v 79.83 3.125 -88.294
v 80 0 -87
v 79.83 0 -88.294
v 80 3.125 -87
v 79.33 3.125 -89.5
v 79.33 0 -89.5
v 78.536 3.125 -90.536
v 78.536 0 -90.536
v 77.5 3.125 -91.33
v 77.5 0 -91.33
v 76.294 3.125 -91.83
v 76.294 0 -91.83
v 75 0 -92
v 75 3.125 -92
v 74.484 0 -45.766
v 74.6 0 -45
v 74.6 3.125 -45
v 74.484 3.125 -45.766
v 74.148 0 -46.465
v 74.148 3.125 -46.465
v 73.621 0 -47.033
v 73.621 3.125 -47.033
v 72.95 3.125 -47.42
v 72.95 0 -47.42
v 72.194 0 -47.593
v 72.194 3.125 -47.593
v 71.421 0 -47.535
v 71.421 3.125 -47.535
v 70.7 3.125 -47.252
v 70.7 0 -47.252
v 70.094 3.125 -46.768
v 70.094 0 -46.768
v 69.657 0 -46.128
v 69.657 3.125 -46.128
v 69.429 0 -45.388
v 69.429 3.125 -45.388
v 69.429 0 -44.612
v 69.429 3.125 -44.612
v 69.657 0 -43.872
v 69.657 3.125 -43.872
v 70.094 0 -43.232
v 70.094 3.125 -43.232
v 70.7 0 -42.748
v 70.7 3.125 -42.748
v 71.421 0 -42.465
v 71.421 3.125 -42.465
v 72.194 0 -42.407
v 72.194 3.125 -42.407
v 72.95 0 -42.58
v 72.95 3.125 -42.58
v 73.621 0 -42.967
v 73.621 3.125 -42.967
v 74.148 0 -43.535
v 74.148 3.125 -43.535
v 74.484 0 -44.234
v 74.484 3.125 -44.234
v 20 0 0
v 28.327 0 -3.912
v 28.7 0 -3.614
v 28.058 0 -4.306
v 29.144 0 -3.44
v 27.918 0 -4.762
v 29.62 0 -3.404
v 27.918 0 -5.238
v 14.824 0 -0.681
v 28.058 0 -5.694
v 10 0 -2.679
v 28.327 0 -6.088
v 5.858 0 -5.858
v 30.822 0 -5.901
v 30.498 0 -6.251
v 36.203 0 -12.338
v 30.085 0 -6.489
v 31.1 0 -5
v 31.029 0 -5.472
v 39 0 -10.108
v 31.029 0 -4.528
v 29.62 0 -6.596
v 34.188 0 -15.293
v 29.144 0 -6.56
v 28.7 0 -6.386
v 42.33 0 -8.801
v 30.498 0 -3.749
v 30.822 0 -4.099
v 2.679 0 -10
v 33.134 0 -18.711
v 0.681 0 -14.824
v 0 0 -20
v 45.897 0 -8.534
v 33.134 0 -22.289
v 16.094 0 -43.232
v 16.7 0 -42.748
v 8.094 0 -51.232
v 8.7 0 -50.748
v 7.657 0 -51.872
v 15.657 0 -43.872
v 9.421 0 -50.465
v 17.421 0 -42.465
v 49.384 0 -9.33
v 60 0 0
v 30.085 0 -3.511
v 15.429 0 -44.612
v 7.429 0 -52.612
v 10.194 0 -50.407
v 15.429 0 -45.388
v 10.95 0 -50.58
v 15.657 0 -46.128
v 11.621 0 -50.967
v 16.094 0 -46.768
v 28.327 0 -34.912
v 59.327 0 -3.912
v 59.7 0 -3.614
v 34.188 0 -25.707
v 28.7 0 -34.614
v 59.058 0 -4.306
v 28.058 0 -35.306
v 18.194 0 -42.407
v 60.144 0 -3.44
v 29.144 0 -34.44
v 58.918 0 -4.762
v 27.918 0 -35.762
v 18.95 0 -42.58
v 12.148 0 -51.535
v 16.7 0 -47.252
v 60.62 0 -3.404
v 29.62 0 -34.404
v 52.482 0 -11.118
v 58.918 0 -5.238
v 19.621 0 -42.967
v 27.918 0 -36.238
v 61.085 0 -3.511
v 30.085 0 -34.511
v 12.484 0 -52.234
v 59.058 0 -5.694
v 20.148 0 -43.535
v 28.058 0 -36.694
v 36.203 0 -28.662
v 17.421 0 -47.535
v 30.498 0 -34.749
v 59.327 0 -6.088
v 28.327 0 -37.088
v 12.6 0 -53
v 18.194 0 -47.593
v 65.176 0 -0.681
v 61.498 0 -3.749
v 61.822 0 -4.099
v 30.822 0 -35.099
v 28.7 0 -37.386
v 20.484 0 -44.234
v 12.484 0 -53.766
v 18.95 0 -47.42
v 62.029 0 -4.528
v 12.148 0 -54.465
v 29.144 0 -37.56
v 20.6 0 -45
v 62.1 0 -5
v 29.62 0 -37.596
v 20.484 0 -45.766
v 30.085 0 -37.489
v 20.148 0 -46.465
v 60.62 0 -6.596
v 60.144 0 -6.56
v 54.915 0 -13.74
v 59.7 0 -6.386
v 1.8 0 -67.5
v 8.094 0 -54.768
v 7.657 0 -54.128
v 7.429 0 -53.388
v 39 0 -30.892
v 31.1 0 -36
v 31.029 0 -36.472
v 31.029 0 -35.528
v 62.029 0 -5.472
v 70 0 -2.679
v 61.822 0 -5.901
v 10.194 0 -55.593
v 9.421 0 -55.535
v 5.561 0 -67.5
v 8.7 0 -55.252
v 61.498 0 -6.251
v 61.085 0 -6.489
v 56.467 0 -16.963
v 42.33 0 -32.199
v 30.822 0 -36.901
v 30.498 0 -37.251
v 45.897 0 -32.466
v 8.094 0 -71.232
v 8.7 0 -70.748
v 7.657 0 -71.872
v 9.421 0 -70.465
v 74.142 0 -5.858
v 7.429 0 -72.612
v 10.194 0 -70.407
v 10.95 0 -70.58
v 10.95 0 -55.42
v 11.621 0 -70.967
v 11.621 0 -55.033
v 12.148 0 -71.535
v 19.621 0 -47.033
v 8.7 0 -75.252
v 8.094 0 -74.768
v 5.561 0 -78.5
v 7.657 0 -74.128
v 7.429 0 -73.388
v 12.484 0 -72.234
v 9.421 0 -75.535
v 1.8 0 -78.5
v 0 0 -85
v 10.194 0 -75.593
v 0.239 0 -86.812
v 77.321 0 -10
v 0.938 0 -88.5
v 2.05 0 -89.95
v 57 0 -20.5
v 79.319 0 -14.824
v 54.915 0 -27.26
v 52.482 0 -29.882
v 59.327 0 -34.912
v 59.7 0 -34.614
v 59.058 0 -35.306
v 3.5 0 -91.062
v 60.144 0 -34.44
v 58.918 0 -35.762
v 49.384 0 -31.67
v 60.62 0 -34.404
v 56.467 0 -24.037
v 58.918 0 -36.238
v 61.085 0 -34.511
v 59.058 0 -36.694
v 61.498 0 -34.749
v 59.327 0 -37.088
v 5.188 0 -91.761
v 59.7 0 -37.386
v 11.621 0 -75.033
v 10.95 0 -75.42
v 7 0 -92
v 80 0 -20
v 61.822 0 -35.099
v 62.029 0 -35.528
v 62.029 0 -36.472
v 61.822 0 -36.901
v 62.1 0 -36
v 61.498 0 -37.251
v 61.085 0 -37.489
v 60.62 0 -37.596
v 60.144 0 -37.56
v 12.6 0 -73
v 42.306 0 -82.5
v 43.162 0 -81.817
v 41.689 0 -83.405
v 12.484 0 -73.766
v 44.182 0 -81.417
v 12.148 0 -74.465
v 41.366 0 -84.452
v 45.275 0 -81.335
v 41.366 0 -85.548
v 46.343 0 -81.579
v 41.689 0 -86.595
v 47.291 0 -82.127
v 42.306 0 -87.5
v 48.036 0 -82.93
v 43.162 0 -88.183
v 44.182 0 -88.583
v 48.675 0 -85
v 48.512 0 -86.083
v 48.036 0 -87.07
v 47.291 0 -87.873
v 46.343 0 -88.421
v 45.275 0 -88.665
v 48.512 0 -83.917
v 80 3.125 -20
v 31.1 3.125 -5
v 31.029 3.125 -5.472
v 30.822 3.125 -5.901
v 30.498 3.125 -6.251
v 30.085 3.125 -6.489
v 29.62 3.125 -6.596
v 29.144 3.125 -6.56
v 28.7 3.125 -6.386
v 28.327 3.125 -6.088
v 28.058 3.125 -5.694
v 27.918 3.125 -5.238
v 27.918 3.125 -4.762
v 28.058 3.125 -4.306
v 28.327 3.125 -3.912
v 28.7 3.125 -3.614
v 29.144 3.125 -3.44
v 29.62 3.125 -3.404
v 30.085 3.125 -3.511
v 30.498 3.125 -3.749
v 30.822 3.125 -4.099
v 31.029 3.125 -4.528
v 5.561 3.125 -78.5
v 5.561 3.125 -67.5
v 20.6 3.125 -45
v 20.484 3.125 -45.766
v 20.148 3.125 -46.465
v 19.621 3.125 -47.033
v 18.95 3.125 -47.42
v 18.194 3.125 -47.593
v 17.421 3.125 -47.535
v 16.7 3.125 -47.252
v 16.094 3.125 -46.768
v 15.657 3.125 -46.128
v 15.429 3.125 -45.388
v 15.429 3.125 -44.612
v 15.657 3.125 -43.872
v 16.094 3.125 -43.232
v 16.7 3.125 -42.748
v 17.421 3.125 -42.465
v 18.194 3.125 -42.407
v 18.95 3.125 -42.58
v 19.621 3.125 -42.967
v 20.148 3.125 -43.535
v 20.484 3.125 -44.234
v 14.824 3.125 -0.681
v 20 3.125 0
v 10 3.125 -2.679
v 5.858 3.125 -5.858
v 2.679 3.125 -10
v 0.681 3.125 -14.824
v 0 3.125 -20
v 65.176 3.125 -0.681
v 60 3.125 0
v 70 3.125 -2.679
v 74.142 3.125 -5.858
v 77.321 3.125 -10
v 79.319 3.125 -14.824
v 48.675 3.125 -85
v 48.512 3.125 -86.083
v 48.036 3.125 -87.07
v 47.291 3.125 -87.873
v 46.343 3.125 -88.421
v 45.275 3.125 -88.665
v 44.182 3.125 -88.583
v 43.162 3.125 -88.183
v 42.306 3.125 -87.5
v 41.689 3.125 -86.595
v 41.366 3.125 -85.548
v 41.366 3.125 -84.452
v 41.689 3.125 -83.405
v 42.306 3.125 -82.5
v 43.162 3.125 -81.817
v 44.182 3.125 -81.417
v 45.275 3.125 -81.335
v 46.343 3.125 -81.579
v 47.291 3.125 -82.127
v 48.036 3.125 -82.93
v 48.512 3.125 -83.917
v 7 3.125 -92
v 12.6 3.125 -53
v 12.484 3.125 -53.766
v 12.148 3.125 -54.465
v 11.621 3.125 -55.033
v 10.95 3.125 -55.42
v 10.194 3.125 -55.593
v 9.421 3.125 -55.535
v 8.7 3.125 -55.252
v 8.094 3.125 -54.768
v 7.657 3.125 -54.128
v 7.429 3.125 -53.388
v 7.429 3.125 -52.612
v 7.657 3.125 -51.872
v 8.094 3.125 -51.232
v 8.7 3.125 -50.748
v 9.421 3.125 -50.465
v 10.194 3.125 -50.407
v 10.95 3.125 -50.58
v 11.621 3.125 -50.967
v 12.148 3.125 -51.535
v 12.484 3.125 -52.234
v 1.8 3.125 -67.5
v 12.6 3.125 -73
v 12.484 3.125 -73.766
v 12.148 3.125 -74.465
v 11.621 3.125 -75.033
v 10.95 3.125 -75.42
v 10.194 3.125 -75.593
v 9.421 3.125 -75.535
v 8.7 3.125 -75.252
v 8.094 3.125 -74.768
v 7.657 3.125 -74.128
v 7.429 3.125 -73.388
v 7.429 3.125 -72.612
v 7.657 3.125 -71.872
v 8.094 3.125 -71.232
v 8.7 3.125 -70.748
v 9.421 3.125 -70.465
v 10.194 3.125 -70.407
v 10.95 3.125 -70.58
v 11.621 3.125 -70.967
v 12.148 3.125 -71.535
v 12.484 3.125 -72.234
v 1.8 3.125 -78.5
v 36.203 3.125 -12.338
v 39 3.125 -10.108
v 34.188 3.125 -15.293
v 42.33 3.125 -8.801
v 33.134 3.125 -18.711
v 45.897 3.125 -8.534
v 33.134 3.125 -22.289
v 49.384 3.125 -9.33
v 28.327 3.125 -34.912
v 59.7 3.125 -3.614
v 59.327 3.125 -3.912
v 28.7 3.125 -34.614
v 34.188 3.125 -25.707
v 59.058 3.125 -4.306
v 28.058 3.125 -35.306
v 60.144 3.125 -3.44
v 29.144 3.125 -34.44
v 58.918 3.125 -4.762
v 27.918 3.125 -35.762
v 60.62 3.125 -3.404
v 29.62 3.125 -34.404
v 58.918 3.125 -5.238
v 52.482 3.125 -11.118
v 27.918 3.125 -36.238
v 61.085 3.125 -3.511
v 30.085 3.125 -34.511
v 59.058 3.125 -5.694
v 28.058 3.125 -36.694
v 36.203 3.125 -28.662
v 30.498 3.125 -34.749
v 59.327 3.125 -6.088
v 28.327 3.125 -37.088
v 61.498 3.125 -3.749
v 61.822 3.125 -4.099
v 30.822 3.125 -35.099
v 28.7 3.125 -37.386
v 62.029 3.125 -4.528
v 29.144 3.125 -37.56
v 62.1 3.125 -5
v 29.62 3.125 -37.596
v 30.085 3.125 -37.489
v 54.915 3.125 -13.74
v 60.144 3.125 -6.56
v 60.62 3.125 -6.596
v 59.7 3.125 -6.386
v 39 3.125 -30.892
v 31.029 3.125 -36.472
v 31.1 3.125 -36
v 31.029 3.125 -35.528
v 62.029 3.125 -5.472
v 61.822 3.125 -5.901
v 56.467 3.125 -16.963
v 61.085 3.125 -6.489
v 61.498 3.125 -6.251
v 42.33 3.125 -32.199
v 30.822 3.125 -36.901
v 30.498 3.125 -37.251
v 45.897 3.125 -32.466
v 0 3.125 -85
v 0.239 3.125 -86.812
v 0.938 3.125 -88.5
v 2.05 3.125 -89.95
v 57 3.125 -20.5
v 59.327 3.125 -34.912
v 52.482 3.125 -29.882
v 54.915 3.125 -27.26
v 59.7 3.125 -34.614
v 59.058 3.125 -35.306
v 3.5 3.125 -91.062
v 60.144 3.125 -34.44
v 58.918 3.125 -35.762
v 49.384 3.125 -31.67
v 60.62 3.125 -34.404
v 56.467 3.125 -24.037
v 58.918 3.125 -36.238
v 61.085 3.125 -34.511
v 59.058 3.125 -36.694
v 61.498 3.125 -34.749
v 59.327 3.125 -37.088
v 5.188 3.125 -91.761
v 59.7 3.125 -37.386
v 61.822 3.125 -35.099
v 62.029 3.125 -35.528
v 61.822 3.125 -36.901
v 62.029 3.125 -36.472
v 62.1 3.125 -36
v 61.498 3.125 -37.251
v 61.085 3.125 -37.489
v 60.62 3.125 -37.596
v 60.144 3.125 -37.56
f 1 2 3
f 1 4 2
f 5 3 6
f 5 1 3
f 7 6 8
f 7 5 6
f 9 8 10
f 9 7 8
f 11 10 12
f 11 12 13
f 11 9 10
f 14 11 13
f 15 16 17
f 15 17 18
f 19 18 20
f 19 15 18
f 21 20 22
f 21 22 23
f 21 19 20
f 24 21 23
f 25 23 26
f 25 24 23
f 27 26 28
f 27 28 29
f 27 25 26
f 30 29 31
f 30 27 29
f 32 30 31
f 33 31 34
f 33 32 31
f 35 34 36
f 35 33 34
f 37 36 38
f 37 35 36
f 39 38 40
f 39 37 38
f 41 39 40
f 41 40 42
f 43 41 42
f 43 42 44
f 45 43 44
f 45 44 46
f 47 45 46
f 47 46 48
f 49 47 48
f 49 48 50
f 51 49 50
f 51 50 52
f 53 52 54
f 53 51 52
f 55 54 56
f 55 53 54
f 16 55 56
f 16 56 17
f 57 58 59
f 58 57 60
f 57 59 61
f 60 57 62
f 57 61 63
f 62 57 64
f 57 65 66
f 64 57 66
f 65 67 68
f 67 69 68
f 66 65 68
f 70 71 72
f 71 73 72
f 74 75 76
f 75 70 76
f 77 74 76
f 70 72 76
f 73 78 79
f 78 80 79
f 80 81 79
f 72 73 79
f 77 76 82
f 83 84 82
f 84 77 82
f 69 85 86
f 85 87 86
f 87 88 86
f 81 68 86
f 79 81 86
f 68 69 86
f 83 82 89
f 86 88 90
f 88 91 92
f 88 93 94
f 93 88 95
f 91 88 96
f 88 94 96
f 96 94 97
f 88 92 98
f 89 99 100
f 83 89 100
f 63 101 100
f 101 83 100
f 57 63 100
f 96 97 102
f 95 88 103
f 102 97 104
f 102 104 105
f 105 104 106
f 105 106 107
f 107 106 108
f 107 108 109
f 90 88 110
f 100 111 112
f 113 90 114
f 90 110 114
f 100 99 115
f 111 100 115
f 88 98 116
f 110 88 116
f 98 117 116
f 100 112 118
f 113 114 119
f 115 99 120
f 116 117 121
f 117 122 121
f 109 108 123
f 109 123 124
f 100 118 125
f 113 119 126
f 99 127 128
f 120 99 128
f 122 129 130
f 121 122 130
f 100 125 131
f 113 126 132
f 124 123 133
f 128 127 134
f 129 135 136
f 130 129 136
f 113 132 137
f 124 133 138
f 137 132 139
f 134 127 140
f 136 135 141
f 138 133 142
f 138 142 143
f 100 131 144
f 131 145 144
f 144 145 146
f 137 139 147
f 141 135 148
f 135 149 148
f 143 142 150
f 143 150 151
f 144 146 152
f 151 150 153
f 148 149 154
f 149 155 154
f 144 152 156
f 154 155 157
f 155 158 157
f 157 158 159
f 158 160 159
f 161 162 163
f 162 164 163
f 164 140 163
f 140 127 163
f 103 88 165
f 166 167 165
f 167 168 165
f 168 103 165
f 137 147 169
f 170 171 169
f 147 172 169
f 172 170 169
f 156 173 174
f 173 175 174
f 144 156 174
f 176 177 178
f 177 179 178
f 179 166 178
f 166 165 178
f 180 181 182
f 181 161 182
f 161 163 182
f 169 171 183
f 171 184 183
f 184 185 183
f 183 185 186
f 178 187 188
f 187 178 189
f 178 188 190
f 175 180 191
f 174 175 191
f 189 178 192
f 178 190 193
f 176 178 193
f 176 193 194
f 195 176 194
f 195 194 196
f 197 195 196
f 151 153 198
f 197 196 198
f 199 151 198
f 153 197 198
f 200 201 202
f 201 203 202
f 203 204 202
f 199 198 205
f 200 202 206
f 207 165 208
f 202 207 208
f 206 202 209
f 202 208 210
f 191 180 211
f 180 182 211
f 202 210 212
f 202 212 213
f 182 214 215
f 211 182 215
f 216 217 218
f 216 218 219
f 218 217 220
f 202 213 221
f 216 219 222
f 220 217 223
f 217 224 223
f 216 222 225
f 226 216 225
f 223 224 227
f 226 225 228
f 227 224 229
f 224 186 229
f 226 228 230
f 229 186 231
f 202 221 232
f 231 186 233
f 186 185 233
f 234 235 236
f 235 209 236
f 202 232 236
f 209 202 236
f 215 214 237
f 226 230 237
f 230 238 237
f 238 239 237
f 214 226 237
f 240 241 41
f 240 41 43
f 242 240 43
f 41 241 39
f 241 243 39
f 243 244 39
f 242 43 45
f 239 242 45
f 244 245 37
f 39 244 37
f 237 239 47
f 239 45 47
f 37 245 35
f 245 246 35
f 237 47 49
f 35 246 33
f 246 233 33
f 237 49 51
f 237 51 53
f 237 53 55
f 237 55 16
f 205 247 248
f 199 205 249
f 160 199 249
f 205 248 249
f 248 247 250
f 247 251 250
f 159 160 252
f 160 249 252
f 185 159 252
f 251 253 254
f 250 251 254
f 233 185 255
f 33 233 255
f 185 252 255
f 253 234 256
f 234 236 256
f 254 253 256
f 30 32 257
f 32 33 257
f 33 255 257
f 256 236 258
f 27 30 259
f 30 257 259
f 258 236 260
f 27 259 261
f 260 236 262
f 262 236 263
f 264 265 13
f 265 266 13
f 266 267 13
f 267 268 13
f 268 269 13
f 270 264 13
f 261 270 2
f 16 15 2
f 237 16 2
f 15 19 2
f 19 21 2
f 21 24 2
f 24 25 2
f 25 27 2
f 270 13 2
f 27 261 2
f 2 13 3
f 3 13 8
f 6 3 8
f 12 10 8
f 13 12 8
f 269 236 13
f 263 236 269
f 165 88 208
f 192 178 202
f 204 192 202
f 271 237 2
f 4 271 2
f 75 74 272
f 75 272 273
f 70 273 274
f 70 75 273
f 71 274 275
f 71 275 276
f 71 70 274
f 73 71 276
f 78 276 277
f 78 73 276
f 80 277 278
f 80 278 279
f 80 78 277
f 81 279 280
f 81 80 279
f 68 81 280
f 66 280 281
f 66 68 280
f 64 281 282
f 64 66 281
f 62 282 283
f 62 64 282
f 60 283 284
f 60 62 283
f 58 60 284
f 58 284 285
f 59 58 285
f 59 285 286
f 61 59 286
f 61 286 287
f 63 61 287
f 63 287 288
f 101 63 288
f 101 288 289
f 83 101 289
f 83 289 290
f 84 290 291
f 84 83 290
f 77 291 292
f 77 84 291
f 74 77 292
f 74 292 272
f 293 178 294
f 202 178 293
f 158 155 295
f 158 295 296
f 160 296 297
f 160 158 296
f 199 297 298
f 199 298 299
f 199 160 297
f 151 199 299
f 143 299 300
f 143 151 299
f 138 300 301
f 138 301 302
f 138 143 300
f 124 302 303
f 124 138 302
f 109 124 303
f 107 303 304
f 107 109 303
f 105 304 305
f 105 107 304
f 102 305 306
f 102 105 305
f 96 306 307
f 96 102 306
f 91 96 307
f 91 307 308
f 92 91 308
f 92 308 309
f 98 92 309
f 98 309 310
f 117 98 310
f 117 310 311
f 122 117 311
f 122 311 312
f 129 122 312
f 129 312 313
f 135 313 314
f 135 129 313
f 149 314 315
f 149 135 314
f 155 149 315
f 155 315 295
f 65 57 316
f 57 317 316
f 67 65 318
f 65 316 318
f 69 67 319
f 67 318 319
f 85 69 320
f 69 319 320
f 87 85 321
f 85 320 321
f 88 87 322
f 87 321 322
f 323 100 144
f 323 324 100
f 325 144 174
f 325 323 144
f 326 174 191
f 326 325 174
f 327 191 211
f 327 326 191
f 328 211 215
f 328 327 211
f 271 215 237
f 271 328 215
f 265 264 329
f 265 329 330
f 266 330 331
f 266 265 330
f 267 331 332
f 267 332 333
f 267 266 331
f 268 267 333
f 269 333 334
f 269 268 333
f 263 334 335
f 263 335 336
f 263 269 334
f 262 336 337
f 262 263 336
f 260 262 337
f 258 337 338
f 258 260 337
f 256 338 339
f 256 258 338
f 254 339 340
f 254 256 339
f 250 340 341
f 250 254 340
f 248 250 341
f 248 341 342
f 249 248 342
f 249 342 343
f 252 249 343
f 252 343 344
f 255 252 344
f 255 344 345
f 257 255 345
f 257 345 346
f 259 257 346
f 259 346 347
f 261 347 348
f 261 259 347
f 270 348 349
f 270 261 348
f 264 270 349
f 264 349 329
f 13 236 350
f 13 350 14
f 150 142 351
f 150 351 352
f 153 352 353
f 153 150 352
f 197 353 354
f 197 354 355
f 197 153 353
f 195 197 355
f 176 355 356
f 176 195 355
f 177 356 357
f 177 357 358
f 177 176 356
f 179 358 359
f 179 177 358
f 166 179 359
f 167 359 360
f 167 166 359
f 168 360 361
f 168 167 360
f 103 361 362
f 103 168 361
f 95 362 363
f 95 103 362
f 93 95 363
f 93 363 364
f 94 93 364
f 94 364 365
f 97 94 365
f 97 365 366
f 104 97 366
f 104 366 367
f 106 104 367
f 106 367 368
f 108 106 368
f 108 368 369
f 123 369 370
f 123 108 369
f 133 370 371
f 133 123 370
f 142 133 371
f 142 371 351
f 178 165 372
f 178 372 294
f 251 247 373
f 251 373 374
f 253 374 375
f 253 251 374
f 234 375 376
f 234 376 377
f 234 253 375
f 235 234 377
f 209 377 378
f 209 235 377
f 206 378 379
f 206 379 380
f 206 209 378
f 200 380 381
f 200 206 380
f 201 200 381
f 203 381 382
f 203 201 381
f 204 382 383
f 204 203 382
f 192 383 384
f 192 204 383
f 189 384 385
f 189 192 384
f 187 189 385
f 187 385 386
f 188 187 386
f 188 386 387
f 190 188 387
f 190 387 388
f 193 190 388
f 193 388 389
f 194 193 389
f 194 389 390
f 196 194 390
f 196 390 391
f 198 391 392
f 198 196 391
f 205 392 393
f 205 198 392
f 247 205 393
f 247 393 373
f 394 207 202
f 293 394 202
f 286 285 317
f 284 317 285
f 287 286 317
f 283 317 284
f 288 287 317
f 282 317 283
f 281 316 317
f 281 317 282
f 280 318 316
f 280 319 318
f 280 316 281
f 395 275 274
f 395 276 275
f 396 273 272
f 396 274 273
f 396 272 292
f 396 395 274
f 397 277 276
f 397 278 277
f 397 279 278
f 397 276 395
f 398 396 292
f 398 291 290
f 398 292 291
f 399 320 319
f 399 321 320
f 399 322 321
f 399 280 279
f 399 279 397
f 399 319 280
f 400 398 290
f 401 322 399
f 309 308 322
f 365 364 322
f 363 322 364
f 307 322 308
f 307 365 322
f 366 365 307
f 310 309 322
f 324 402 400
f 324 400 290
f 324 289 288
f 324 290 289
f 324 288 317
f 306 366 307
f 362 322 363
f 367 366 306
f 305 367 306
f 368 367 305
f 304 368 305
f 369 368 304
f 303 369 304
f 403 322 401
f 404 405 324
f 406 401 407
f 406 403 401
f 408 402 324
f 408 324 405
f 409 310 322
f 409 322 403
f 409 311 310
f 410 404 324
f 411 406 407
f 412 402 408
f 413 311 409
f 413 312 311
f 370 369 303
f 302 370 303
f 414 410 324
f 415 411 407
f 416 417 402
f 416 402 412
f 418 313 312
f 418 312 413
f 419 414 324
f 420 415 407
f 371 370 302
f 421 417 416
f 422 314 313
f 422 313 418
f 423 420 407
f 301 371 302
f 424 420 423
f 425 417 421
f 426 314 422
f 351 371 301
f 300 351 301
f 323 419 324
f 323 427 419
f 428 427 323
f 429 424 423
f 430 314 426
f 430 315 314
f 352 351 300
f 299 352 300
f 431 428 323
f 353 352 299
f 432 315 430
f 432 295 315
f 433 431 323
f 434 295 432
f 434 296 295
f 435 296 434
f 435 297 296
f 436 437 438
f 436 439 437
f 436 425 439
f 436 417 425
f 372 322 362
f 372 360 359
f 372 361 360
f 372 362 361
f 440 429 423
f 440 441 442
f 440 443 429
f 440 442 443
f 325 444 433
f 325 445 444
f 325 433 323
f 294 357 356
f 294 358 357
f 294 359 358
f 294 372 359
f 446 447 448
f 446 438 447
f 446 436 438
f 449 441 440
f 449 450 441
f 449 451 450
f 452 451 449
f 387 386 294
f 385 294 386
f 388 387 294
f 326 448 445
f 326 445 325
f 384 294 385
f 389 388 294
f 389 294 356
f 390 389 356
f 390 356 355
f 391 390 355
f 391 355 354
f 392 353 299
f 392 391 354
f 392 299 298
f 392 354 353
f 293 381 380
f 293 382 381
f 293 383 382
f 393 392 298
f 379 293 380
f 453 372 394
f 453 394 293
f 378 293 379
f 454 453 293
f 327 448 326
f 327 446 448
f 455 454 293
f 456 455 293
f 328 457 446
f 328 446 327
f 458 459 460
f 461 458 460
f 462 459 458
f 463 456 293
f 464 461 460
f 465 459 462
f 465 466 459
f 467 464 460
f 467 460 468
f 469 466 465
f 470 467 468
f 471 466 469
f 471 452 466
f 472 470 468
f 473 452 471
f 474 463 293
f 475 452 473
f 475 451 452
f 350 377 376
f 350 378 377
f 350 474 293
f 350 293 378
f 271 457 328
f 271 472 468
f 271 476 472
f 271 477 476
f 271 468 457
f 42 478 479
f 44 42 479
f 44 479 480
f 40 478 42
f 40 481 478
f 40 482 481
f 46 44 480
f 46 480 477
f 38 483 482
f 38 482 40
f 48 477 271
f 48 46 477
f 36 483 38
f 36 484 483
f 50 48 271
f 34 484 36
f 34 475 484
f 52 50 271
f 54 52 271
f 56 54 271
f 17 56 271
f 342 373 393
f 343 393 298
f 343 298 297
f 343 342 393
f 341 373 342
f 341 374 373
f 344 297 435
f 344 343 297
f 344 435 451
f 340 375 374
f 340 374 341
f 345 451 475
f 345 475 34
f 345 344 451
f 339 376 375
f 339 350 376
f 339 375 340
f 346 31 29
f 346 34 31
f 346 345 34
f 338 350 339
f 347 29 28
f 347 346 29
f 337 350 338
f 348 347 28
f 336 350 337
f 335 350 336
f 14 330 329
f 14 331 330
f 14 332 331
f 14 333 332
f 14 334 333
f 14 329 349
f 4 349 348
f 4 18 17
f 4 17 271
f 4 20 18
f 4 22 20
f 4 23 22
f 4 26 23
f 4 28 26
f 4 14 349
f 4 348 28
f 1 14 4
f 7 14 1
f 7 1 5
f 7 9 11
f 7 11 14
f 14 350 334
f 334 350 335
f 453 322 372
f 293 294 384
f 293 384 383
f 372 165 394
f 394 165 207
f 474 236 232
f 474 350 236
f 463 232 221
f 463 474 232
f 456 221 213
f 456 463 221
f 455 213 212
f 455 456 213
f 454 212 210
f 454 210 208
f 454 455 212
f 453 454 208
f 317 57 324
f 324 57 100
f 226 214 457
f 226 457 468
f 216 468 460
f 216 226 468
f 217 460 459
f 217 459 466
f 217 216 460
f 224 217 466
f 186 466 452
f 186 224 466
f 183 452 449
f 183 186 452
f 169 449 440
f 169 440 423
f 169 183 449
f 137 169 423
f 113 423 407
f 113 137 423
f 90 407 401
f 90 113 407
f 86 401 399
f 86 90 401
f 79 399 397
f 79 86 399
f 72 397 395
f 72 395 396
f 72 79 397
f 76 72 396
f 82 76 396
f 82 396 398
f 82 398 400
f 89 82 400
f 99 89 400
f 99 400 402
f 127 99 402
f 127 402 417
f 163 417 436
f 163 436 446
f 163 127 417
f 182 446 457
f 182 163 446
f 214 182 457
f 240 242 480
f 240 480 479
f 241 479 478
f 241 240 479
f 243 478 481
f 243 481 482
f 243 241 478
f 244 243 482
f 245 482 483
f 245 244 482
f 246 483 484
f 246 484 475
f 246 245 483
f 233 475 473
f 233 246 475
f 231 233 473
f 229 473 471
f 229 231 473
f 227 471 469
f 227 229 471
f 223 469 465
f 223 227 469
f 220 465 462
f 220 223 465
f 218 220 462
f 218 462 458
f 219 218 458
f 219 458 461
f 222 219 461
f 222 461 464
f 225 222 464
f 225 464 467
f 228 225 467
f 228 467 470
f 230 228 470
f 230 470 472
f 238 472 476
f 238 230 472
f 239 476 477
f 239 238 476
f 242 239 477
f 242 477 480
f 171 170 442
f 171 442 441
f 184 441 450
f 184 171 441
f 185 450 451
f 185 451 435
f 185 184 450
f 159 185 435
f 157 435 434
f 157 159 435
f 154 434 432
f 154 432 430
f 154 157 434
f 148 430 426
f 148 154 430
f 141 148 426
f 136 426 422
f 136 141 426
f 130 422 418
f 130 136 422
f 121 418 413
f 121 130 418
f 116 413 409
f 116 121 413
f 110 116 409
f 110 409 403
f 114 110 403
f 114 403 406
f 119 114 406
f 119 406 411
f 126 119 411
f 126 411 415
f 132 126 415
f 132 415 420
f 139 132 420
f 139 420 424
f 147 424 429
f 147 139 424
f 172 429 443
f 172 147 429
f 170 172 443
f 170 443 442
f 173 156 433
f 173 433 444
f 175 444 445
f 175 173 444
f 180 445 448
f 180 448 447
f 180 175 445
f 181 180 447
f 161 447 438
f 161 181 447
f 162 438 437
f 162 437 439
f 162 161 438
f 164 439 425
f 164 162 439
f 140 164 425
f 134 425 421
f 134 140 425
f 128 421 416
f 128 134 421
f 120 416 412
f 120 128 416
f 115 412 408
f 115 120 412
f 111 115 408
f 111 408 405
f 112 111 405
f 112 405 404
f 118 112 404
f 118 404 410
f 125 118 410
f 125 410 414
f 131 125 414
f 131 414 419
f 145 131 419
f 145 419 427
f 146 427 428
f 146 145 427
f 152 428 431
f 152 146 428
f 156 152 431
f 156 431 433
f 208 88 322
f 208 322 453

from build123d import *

# Parameters (mm, degrees)
SKETCH2_W           = 80
SKETCH2_H           = 92
SKETCH2_R           = 1.6
SKETCH2_R_2         = 2.6
SKETCH2_R_3         = 12
SKETCH2_R_4         = 3.675
SKETCH2_W_2         = 3.760660172
SKETCH2_H_2         = 11
BOSS_EXTRUDE1_DEPTH = 3.125
FILLET1_R           = 20
FILLET2_R           = 20
FILLET4_R           = 5
FILLET5_R           = 7


with BuildPart() as part:
    # Sketch2 → Boss-Extrude1 (new body)
    with BuildSketch(Plane(origin=(0, 0, 0), x_dir=(1, 0, 0), z_dir=(0, 1, 0))):
        with Locations((40, 46)):
            Rectangle(SKETCH2_W, SKETCH2_H)
        with Locations((29.5, 5)):
            Circle(SKETCH2_R, mode=Mode.SUBTRACT)
        with Locations((29.5, 36)):
            Circle(SKETCH2_R, mode=Mode.SUBTRACT)
        with Locations((60.5, 36)):
            Circle(SKETCH2_R, mode=Mode.SUBTRACT)
        with Locations((60.5, 5)):
            Circle(SKETCH2_R, mode=Mode.SUBTRACT)
        with Locations((18, 45)):
            Circle(SKETCH2_R_2, mode=Mode.SUBTRACT)
        with Locations((72, 45)):
            Circle(SKETCH2_R_2, mode=Mode.SUBTRACT)
        with Locations((45, 20.5)):
            Circle(SKETCH2_R_3, mode=Mode.SUBTRACT)
        with Locations((45, 85)):
            Circle(SKETCH2_R_4, mode=Mode.SUBTRACT)
        with Locations((10, 53)):
            Circle(SKETCH2_R_2, mode=Mode.SUBTRACT)
        with Locations((10, 73)):
            Circle(SKETCH2_R_2, mode=Mode.SUBTRACT)
        with Locations((3.680330086, 73)):
            Rectangle(SKETCH2_W_2, SKETCH2_H_2, mode=Mode.SUBTRACT)
    extrude(amount=BOSS_EXTRUDE1_DEPTH)

    # Fillet1
    fillet1_edges = [part.edges().sort_by_distance(p)[0] for p in [
        (80, 1.5625, 0),
    ]]
    fillet(fillet1_edges, radius=FILLET1_R)

    # Fillet2
    fillet2_edges = [part.edges().sort_by_distance(p)[0] for p in [
        (0, 1.5625, 0),
    ]]
    fillet(fillet2_edges, radius=FILLET2_R)

    # Fillet4
    fillet4_edges = [part.edges().sort_by_distance(p)[0] for p in [
        (80, 1.5625, -92),
    ]]
    fillet(fillet4_edges, radius=FILLET4_R)

    # Fillet5
    fillet5_edges = [part.edges().sort_by_distance(p)[0] for p in [
        (0, 1.5625, -92),
    ]]
    fillet(fillet5_edges, radius=FILLET5_R)


solid = part.part
